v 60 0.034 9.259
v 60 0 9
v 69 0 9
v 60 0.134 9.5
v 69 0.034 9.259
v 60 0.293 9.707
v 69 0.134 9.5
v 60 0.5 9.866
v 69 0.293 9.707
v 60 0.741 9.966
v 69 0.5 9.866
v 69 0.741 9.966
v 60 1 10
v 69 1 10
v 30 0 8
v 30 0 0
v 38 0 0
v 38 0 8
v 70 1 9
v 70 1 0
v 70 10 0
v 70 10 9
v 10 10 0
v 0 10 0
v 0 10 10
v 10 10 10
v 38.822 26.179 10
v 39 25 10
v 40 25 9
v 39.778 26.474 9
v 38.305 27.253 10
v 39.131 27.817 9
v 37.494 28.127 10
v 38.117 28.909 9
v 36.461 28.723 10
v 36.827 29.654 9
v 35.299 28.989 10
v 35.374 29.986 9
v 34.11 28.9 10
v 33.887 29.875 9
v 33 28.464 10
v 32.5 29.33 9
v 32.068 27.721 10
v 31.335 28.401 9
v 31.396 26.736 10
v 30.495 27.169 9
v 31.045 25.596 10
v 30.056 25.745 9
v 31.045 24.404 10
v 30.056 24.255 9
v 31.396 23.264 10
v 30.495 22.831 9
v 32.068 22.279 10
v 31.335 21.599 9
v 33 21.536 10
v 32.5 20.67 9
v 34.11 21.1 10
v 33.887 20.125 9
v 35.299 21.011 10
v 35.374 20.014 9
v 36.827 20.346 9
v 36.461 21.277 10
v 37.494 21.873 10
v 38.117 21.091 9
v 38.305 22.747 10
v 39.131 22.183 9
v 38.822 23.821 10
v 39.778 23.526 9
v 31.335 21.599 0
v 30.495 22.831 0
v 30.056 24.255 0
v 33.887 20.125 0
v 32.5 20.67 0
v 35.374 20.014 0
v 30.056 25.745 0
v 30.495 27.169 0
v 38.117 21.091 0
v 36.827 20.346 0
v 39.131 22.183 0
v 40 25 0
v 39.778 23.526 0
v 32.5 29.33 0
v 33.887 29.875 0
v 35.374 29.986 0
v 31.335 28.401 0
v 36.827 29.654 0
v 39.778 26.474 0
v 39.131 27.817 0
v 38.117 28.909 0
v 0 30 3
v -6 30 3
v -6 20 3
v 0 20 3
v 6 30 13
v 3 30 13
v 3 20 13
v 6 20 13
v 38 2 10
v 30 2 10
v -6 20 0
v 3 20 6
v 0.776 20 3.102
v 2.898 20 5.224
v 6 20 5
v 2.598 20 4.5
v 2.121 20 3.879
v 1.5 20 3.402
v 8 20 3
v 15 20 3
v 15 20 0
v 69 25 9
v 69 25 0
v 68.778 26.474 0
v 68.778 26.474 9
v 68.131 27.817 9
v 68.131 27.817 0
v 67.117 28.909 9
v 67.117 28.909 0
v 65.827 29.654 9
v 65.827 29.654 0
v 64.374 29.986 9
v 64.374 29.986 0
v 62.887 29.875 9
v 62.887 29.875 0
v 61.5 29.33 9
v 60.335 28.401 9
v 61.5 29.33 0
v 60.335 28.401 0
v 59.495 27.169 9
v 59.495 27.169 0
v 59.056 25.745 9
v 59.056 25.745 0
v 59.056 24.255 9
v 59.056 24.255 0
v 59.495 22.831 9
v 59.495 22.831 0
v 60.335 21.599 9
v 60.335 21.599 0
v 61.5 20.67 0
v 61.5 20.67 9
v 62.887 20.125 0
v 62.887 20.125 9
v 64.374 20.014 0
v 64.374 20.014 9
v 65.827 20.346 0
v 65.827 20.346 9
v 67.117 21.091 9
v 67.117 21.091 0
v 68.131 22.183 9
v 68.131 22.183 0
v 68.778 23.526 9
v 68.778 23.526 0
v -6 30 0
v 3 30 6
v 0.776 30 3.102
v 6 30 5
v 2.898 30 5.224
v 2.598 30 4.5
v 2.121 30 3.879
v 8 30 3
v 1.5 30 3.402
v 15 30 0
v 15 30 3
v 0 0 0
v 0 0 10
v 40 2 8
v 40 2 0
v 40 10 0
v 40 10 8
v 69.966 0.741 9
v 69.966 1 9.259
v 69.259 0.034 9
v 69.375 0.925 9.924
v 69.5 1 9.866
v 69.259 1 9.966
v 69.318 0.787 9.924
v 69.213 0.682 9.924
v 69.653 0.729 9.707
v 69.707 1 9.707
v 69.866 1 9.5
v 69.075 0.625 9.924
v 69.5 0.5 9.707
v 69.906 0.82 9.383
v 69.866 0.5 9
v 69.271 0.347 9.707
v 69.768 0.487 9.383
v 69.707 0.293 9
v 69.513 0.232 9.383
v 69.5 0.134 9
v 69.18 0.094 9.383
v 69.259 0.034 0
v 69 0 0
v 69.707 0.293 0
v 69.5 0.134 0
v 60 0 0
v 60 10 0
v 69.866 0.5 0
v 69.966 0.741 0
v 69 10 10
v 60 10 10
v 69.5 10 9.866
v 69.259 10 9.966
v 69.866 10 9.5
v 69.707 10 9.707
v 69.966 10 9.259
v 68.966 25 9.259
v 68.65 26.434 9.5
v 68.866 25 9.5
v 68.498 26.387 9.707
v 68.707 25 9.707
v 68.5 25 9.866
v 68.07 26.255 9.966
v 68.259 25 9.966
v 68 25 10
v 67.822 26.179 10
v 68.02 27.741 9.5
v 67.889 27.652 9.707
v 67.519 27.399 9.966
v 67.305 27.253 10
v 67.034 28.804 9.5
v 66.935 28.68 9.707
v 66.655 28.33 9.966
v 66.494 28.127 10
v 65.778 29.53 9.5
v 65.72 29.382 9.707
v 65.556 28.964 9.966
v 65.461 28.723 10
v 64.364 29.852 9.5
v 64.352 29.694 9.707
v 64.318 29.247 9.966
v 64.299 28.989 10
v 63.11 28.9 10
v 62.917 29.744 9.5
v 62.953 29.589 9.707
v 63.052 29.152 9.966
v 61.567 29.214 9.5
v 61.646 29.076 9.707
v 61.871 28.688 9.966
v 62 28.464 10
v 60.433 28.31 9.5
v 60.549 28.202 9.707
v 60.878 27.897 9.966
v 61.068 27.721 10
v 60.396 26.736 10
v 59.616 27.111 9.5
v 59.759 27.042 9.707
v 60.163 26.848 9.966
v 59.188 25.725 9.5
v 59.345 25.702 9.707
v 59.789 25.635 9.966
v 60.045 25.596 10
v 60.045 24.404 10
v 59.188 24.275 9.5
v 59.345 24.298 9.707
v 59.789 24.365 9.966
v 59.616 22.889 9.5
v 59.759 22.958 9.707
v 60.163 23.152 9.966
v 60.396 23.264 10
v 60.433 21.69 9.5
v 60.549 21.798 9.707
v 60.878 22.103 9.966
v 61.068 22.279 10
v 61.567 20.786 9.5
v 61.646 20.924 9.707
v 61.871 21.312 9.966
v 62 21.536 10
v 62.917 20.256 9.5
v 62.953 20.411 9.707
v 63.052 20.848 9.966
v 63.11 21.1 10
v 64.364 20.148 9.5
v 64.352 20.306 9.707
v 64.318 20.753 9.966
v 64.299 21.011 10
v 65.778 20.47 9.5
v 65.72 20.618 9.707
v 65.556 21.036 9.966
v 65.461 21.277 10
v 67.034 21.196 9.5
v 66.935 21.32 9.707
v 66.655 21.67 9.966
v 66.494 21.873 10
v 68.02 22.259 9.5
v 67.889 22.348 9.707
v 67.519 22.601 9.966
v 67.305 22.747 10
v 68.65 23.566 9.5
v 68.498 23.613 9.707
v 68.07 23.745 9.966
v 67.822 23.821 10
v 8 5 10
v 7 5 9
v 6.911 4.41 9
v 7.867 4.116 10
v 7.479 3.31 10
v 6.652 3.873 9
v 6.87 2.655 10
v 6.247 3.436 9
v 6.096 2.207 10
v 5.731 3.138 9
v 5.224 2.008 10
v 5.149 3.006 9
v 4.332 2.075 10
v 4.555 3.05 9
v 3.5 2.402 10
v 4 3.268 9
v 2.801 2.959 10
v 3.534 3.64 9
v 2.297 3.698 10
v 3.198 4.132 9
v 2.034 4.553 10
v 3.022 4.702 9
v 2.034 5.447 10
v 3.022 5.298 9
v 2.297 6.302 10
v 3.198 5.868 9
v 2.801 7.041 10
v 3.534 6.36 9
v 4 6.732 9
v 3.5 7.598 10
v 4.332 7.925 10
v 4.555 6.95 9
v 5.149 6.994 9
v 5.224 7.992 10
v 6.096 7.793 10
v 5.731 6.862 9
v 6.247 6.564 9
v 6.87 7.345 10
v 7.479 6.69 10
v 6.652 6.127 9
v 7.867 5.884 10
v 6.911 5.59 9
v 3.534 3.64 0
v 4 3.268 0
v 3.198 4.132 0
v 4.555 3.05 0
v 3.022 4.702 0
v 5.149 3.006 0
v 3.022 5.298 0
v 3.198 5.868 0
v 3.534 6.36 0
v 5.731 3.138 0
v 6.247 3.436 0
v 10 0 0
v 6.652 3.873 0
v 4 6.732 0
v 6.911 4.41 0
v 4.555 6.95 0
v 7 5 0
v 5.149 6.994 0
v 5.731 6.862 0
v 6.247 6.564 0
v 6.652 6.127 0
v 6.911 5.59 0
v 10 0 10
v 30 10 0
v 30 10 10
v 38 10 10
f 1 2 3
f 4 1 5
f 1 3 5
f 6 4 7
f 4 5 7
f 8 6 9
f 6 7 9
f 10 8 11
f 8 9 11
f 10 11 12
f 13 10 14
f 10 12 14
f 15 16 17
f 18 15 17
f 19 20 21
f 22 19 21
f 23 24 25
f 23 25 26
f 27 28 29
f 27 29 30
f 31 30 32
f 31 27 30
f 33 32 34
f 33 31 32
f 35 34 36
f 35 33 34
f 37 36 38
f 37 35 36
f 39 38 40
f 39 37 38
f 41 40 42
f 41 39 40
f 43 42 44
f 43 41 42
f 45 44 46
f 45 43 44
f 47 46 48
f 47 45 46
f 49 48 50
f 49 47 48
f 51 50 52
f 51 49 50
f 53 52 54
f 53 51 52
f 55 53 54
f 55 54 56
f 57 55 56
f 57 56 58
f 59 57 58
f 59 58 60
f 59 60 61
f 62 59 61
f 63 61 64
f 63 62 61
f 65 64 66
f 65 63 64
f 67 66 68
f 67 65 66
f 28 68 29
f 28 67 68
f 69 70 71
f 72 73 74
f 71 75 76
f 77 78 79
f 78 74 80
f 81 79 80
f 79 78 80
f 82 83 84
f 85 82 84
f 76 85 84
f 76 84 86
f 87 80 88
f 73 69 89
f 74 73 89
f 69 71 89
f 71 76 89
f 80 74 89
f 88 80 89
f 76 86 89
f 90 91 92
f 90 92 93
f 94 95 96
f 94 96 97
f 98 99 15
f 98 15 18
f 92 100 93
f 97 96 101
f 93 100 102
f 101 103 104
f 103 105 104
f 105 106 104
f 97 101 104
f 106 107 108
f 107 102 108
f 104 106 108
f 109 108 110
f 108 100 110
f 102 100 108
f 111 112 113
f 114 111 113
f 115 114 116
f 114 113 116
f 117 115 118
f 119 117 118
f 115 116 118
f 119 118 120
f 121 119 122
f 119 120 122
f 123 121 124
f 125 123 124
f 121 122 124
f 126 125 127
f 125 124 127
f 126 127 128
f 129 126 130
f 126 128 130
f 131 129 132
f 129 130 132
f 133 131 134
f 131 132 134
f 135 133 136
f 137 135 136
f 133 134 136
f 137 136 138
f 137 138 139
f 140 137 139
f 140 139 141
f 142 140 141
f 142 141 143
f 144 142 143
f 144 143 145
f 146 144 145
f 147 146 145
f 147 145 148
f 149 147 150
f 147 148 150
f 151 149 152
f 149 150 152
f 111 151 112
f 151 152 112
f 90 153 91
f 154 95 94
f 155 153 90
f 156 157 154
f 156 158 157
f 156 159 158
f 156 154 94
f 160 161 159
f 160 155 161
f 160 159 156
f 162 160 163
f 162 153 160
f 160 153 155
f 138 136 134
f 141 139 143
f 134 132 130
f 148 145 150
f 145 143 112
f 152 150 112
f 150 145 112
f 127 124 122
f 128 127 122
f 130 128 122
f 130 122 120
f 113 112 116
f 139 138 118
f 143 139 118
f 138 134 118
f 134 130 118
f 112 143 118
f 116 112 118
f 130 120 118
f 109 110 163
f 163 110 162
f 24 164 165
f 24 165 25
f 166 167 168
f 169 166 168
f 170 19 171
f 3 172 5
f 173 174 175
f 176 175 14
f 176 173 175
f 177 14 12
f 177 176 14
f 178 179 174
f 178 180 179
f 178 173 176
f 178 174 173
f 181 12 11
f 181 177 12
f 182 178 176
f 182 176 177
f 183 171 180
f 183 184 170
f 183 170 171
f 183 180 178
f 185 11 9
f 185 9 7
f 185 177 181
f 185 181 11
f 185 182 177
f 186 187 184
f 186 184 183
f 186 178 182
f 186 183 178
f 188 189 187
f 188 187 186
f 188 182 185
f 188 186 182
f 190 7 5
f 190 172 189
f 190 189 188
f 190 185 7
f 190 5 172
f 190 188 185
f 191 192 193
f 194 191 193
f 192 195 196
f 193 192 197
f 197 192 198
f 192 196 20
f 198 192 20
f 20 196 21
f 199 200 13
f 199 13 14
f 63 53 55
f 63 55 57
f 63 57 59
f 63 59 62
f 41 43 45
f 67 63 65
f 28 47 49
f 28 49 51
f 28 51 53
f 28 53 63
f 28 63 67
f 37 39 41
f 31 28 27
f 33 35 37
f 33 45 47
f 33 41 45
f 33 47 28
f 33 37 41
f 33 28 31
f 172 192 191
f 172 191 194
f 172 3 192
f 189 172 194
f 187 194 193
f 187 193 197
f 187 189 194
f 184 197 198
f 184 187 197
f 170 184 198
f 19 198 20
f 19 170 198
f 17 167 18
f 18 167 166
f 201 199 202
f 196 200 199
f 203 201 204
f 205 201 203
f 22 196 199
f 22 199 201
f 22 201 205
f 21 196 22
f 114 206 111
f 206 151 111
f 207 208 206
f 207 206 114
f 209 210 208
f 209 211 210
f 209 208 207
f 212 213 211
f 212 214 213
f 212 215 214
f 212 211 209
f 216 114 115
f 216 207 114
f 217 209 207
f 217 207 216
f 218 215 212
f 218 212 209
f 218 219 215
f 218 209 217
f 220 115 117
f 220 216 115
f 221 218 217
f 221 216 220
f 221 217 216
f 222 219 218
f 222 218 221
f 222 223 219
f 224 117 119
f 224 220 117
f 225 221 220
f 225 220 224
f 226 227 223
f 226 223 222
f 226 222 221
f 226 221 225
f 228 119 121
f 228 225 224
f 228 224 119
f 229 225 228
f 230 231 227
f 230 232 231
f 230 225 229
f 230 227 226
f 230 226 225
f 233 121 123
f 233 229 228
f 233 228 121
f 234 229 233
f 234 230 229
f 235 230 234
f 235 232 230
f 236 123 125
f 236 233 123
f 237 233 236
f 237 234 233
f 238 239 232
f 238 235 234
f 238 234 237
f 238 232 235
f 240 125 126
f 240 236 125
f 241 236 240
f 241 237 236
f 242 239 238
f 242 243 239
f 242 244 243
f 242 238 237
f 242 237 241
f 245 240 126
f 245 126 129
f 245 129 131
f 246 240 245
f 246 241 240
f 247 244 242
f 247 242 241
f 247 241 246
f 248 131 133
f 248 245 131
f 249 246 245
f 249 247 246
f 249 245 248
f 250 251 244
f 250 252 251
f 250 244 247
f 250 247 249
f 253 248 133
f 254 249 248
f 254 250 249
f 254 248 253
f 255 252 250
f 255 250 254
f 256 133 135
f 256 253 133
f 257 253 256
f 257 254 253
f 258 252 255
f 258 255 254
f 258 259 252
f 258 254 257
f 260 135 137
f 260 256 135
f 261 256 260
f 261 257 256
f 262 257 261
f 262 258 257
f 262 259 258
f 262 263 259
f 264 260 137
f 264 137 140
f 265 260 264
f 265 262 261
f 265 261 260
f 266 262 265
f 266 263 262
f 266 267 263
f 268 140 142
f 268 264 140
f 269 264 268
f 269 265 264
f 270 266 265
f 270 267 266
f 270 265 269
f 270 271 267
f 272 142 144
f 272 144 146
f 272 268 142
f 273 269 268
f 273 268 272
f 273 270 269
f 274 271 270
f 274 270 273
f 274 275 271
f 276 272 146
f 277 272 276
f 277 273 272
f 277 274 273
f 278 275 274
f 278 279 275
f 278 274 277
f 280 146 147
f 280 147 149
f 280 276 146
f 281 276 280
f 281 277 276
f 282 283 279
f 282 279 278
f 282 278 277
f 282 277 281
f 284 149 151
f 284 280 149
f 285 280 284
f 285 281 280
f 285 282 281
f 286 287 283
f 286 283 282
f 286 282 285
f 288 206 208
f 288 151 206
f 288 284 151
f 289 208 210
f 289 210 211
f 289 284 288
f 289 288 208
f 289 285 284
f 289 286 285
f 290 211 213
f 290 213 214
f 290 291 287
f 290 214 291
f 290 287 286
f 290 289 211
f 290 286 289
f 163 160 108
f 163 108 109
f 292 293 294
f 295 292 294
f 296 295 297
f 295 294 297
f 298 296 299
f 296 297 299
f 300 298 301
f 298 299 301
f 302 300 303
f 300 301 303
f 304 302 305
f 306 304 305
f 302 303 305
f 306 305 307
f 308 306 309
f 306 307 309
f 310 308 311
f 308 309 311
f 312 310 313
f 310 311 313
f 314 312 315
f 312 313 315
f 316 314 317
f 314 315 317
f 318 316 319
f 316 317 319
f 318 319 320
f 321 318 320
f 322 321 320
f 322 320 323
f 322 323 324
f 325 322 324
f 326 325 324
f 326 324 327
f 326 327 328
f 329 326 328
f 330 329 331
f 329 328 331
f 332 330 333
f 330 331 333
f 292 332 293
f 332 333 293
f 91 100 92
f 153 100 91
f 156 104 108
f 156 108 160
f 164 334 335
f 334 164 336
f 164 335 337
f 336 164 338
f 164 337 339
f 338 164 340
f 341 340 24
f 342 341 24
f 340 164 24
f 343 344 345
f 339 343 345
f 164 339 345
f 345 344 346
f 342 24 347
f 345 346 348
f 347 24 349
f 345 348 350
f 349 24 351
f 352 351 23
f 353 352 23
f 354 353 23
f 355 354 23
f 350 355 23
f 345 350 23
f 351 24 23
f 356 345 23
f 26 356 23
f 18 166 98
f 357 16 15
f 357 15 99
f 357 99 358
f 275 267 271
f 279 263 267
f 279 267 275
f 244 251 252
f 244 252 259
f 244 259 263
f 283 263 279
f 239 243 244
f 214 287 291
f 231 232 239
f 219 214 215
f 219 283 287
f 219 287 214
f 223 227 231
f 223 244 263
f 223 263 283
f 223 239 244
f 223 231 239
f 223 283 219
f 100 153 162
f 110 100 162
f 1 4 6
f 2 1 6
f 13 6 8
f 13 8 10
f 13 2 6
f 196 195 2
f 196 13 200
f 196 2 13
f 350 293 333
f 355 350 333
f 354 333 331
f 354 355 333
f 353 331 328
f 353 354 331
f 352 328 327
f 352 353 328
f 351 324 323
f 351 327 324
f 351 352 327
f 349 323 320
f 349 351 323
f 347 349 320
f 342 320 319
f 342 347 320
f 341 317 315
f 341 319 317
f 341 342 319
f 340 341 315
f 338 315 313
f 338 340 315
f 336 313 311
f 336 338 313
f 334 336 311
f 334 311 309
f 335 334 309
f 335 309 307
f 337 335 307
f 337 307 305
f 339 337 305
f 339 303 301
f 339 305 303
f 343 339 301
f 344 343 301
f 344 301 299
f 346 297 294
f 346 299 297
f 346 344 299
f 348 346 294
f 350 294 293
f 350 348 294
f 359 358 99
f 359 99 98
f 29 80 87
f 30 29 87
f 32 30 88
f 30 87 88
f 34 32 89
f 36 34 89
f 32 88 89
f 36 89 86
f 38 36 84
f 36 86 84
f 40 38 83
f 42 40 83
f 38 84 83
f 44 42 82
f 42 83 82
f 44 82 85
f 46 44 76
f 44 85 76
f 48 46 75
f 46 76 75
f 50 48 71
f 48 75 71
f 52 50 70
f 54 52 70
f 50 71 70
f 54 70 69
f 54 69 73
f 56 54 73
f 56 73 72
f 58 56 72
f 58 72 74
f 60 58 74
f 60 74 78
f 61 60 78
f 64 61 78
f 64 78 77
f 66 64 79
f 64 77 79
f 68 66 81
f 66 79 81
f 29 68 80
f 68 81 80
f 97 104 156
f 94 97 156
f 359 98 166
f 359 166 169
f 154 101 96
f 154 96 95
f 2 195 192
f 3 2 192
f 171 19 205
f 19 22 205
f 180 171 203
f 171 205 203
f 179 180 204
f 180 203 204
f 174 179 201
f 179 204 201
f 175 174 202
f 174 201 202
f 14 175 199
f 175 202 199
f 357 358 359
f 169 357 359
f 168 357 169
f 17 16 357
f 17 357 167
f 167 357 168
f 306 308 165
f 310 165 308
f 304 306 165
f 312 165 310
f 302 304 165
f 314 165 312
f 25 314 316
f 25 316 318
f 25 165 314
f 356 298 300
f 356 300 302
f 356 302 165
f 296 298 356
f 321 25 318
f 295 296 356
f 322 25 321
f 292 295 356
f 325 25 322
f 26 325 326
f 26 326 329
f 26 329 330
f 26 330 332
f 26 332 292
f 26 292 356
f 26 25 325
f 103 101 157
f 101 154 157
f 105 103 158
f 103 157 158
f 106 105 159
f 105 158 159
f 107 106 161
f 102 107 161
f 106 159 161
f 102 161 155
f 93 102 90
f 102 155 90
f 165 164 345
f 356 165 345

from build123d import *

# Parameters (mm, degrees)
BOX002_W          = 10
BOX002_H          = 10
BOX002_DEPTH      = 10
FILLET_R          = 1
BOX001_W          = 10
BOX001_H          = 10
BOX001_DEPTH      = 10
CHAMFER_SIZE      = 2
CYLINDER002_R     = 2
CYLINDER002_DEPTH = 12
BOX_W             = 10
BOX_H             = 10
BOX_DEPTH         = 10
CHAMFER001_SIZE   = 1
CYLINDER_R        = 5
CYLINDER_DEPTH    = 10
FILLET001_R       = 1
CYLINDER001_R     = 5
CYLINDER001_DEPTH = 10
CHAMFER002_SIZE   = 1
BOX004_W          = 3
BOX004_H          = 10
BOX004_DEPTH      = 10
BOX003_W          = 21
BOX003_H          = 10
BOX003_DEPTH      = 3
CHAMFER003_SIZE   = 2
FILLET002_R       = 3


with BuildPart() as cantell_rodo:
    # Box002 → Box002 (new body)
    with BuildSketch(Plane(origin=(60, 0, 0), x_dir=(1, 0, 0), z_dir=(0, 0, 1))):
        with Locations((5, 5)):
            Rectangle(BOX002_W, BOX002_H)
    extrude(amount=BOX002_DEPTH)

    # Fillet
    fillet_edges = [cantell_rodo.edges().sort_by_distance(p)[0] for p in [
        (70, 0, 5),
        (70, 5, 10),
        (65, 0, 10),
    ]]
    fillet(fillet_edges, radius=FILLET_R)


with BuildPart() as chamfer_body:
    # Box001 → Box001 (new body)
    with BuildSketch(Plane(origin=(30, 0, 0), x_dir=(1, 0, 0), z_dir=(0, 0, 1))):
        with Locations((5, 5)):
            Rectangle(BOX001_W, BOX001_H)
    extrude(amount=BOX001_DEPTH)

    # Chamfer
    chamfer_edges = [chamfer_body.edges().sort_by_distance(p)[0] for p in [
        (40, 0, 5),
        (40, 5, 10),
        (35, 0, 10),
    ]]
    chamfer(chamfer_edges, length=CHAMFER_SIZE)


with BuildPart() as cylinder002:
    # Cylinder002 → Cylinder002 (new body)
    with BuildSketch(Plane(origin=(5, 5, -1), x_dir=(1, 0, 0), z_dir=(0, 0, 1))):
        Circle(CYLINDER002_R)
    extrude(amount=CYLINDER002_DEPTH)


with BuildPart() as chamfer001:
    # Box → Box (new body)
    with BuildSketch(Plane.XY):
        with Locations((5, 5)):
            Rectangle(BOX_W, BOX_H)
    extrude(amount=BOX_DEPTH)

    # Cut: cut Cylinder002
    add(cylinder002.part, mode=Mode.SUBTRACT)

    # Chamfer001
    chamfer001_edges = [chamfer001.edges().sort_by_distance(p)[0] for p in [
        (3, 5, 10),
    ]]
    chamfer(chamfer001_edges, length=CHAMFER001_SIZE)


with BuildPart() as fillet001:
    # Cylinder → Cylinder (new body)
    with BuildSketch(Plane(origin=(64, 25, 0), x_dir=(1, 0, 0), z_dir=(0, 0, 1))):
        Circle(CYLINDER_R)
    extrude(amount=CYLINDER_DEPTH)

    # Fillet001
    fillet001_edges = [fillet001.edges().sort_by_distance(p)[0] for p in [
        (59, 25, 10),
    ]]
    fillet(fillet001_edges, radius=FILLET001_R)


with BuildPart() as chamfer002:
    # Cylinder001 → Cylinder001 (new body)
    with BuildSketch(Plane(origin=(35, 25, 0), x_dir=(1, 0, 0), z_dir=(0, 0, 1))):
        Circle(CYLINDER001_R)
    extrude(amount=CYLINDER001_DEPTH)

    # Chamfer002
    chamfer002_edges = [chamfer002.edges().sort_by_distance(p)[0] for p in [
        (30, 25, 10),
    ]]
    chamfer(chamfer002_edges, length=CHAMFER002_SIZE)


with BuildPart() as cube004:
    # Box004 → Box004 (new body)
    with BuildSketch(Plane(origin=(3, 20, 3), x_dir=(1, 0, 0), z_dir=(0, 0, 1))):
        with Locations((1.5, 5)):
            Rectangle(BOX004_W, BOX004_H)
    extrude(amount=BOX004_DEPTH)


with BuildPart() as refor_os:
    # Box003 → Box003 (new body)
    with BuildSketch(Plane(origin=(-6, 20, 0), x_dir=(1, 0, 0), z_dir=(0, 0, 1))):
        with Locations((10.5, 5)):
            Rectangle(BOX003_W, BOX003_H)
    extrude(amount=BOX003_DEPTH)

    # Fusion: union Cube004
    add(cube004.part)

    # Chamfer003
    chamfer003_edges = [refor_os.edges().sort_by_distance(p)[0] for p in [
        (6, 25, 3),
    ]]
    chamfer(chamfer003_edges, length=CHAMFER003_SIZE)

    # Fillet002
    fillet002_edges = [refor_os.edges().sort_by_distance(p)[0] for p in [
        (3, 25, 3),
    ]]
    fillet(fillet002_edges, radius=FILLET002_R)


solid = Compound([cantell_rodo.part, chamfer_body.part, chamfer001.part, fillet001.part, chamfer002.part, refor_os.part])
